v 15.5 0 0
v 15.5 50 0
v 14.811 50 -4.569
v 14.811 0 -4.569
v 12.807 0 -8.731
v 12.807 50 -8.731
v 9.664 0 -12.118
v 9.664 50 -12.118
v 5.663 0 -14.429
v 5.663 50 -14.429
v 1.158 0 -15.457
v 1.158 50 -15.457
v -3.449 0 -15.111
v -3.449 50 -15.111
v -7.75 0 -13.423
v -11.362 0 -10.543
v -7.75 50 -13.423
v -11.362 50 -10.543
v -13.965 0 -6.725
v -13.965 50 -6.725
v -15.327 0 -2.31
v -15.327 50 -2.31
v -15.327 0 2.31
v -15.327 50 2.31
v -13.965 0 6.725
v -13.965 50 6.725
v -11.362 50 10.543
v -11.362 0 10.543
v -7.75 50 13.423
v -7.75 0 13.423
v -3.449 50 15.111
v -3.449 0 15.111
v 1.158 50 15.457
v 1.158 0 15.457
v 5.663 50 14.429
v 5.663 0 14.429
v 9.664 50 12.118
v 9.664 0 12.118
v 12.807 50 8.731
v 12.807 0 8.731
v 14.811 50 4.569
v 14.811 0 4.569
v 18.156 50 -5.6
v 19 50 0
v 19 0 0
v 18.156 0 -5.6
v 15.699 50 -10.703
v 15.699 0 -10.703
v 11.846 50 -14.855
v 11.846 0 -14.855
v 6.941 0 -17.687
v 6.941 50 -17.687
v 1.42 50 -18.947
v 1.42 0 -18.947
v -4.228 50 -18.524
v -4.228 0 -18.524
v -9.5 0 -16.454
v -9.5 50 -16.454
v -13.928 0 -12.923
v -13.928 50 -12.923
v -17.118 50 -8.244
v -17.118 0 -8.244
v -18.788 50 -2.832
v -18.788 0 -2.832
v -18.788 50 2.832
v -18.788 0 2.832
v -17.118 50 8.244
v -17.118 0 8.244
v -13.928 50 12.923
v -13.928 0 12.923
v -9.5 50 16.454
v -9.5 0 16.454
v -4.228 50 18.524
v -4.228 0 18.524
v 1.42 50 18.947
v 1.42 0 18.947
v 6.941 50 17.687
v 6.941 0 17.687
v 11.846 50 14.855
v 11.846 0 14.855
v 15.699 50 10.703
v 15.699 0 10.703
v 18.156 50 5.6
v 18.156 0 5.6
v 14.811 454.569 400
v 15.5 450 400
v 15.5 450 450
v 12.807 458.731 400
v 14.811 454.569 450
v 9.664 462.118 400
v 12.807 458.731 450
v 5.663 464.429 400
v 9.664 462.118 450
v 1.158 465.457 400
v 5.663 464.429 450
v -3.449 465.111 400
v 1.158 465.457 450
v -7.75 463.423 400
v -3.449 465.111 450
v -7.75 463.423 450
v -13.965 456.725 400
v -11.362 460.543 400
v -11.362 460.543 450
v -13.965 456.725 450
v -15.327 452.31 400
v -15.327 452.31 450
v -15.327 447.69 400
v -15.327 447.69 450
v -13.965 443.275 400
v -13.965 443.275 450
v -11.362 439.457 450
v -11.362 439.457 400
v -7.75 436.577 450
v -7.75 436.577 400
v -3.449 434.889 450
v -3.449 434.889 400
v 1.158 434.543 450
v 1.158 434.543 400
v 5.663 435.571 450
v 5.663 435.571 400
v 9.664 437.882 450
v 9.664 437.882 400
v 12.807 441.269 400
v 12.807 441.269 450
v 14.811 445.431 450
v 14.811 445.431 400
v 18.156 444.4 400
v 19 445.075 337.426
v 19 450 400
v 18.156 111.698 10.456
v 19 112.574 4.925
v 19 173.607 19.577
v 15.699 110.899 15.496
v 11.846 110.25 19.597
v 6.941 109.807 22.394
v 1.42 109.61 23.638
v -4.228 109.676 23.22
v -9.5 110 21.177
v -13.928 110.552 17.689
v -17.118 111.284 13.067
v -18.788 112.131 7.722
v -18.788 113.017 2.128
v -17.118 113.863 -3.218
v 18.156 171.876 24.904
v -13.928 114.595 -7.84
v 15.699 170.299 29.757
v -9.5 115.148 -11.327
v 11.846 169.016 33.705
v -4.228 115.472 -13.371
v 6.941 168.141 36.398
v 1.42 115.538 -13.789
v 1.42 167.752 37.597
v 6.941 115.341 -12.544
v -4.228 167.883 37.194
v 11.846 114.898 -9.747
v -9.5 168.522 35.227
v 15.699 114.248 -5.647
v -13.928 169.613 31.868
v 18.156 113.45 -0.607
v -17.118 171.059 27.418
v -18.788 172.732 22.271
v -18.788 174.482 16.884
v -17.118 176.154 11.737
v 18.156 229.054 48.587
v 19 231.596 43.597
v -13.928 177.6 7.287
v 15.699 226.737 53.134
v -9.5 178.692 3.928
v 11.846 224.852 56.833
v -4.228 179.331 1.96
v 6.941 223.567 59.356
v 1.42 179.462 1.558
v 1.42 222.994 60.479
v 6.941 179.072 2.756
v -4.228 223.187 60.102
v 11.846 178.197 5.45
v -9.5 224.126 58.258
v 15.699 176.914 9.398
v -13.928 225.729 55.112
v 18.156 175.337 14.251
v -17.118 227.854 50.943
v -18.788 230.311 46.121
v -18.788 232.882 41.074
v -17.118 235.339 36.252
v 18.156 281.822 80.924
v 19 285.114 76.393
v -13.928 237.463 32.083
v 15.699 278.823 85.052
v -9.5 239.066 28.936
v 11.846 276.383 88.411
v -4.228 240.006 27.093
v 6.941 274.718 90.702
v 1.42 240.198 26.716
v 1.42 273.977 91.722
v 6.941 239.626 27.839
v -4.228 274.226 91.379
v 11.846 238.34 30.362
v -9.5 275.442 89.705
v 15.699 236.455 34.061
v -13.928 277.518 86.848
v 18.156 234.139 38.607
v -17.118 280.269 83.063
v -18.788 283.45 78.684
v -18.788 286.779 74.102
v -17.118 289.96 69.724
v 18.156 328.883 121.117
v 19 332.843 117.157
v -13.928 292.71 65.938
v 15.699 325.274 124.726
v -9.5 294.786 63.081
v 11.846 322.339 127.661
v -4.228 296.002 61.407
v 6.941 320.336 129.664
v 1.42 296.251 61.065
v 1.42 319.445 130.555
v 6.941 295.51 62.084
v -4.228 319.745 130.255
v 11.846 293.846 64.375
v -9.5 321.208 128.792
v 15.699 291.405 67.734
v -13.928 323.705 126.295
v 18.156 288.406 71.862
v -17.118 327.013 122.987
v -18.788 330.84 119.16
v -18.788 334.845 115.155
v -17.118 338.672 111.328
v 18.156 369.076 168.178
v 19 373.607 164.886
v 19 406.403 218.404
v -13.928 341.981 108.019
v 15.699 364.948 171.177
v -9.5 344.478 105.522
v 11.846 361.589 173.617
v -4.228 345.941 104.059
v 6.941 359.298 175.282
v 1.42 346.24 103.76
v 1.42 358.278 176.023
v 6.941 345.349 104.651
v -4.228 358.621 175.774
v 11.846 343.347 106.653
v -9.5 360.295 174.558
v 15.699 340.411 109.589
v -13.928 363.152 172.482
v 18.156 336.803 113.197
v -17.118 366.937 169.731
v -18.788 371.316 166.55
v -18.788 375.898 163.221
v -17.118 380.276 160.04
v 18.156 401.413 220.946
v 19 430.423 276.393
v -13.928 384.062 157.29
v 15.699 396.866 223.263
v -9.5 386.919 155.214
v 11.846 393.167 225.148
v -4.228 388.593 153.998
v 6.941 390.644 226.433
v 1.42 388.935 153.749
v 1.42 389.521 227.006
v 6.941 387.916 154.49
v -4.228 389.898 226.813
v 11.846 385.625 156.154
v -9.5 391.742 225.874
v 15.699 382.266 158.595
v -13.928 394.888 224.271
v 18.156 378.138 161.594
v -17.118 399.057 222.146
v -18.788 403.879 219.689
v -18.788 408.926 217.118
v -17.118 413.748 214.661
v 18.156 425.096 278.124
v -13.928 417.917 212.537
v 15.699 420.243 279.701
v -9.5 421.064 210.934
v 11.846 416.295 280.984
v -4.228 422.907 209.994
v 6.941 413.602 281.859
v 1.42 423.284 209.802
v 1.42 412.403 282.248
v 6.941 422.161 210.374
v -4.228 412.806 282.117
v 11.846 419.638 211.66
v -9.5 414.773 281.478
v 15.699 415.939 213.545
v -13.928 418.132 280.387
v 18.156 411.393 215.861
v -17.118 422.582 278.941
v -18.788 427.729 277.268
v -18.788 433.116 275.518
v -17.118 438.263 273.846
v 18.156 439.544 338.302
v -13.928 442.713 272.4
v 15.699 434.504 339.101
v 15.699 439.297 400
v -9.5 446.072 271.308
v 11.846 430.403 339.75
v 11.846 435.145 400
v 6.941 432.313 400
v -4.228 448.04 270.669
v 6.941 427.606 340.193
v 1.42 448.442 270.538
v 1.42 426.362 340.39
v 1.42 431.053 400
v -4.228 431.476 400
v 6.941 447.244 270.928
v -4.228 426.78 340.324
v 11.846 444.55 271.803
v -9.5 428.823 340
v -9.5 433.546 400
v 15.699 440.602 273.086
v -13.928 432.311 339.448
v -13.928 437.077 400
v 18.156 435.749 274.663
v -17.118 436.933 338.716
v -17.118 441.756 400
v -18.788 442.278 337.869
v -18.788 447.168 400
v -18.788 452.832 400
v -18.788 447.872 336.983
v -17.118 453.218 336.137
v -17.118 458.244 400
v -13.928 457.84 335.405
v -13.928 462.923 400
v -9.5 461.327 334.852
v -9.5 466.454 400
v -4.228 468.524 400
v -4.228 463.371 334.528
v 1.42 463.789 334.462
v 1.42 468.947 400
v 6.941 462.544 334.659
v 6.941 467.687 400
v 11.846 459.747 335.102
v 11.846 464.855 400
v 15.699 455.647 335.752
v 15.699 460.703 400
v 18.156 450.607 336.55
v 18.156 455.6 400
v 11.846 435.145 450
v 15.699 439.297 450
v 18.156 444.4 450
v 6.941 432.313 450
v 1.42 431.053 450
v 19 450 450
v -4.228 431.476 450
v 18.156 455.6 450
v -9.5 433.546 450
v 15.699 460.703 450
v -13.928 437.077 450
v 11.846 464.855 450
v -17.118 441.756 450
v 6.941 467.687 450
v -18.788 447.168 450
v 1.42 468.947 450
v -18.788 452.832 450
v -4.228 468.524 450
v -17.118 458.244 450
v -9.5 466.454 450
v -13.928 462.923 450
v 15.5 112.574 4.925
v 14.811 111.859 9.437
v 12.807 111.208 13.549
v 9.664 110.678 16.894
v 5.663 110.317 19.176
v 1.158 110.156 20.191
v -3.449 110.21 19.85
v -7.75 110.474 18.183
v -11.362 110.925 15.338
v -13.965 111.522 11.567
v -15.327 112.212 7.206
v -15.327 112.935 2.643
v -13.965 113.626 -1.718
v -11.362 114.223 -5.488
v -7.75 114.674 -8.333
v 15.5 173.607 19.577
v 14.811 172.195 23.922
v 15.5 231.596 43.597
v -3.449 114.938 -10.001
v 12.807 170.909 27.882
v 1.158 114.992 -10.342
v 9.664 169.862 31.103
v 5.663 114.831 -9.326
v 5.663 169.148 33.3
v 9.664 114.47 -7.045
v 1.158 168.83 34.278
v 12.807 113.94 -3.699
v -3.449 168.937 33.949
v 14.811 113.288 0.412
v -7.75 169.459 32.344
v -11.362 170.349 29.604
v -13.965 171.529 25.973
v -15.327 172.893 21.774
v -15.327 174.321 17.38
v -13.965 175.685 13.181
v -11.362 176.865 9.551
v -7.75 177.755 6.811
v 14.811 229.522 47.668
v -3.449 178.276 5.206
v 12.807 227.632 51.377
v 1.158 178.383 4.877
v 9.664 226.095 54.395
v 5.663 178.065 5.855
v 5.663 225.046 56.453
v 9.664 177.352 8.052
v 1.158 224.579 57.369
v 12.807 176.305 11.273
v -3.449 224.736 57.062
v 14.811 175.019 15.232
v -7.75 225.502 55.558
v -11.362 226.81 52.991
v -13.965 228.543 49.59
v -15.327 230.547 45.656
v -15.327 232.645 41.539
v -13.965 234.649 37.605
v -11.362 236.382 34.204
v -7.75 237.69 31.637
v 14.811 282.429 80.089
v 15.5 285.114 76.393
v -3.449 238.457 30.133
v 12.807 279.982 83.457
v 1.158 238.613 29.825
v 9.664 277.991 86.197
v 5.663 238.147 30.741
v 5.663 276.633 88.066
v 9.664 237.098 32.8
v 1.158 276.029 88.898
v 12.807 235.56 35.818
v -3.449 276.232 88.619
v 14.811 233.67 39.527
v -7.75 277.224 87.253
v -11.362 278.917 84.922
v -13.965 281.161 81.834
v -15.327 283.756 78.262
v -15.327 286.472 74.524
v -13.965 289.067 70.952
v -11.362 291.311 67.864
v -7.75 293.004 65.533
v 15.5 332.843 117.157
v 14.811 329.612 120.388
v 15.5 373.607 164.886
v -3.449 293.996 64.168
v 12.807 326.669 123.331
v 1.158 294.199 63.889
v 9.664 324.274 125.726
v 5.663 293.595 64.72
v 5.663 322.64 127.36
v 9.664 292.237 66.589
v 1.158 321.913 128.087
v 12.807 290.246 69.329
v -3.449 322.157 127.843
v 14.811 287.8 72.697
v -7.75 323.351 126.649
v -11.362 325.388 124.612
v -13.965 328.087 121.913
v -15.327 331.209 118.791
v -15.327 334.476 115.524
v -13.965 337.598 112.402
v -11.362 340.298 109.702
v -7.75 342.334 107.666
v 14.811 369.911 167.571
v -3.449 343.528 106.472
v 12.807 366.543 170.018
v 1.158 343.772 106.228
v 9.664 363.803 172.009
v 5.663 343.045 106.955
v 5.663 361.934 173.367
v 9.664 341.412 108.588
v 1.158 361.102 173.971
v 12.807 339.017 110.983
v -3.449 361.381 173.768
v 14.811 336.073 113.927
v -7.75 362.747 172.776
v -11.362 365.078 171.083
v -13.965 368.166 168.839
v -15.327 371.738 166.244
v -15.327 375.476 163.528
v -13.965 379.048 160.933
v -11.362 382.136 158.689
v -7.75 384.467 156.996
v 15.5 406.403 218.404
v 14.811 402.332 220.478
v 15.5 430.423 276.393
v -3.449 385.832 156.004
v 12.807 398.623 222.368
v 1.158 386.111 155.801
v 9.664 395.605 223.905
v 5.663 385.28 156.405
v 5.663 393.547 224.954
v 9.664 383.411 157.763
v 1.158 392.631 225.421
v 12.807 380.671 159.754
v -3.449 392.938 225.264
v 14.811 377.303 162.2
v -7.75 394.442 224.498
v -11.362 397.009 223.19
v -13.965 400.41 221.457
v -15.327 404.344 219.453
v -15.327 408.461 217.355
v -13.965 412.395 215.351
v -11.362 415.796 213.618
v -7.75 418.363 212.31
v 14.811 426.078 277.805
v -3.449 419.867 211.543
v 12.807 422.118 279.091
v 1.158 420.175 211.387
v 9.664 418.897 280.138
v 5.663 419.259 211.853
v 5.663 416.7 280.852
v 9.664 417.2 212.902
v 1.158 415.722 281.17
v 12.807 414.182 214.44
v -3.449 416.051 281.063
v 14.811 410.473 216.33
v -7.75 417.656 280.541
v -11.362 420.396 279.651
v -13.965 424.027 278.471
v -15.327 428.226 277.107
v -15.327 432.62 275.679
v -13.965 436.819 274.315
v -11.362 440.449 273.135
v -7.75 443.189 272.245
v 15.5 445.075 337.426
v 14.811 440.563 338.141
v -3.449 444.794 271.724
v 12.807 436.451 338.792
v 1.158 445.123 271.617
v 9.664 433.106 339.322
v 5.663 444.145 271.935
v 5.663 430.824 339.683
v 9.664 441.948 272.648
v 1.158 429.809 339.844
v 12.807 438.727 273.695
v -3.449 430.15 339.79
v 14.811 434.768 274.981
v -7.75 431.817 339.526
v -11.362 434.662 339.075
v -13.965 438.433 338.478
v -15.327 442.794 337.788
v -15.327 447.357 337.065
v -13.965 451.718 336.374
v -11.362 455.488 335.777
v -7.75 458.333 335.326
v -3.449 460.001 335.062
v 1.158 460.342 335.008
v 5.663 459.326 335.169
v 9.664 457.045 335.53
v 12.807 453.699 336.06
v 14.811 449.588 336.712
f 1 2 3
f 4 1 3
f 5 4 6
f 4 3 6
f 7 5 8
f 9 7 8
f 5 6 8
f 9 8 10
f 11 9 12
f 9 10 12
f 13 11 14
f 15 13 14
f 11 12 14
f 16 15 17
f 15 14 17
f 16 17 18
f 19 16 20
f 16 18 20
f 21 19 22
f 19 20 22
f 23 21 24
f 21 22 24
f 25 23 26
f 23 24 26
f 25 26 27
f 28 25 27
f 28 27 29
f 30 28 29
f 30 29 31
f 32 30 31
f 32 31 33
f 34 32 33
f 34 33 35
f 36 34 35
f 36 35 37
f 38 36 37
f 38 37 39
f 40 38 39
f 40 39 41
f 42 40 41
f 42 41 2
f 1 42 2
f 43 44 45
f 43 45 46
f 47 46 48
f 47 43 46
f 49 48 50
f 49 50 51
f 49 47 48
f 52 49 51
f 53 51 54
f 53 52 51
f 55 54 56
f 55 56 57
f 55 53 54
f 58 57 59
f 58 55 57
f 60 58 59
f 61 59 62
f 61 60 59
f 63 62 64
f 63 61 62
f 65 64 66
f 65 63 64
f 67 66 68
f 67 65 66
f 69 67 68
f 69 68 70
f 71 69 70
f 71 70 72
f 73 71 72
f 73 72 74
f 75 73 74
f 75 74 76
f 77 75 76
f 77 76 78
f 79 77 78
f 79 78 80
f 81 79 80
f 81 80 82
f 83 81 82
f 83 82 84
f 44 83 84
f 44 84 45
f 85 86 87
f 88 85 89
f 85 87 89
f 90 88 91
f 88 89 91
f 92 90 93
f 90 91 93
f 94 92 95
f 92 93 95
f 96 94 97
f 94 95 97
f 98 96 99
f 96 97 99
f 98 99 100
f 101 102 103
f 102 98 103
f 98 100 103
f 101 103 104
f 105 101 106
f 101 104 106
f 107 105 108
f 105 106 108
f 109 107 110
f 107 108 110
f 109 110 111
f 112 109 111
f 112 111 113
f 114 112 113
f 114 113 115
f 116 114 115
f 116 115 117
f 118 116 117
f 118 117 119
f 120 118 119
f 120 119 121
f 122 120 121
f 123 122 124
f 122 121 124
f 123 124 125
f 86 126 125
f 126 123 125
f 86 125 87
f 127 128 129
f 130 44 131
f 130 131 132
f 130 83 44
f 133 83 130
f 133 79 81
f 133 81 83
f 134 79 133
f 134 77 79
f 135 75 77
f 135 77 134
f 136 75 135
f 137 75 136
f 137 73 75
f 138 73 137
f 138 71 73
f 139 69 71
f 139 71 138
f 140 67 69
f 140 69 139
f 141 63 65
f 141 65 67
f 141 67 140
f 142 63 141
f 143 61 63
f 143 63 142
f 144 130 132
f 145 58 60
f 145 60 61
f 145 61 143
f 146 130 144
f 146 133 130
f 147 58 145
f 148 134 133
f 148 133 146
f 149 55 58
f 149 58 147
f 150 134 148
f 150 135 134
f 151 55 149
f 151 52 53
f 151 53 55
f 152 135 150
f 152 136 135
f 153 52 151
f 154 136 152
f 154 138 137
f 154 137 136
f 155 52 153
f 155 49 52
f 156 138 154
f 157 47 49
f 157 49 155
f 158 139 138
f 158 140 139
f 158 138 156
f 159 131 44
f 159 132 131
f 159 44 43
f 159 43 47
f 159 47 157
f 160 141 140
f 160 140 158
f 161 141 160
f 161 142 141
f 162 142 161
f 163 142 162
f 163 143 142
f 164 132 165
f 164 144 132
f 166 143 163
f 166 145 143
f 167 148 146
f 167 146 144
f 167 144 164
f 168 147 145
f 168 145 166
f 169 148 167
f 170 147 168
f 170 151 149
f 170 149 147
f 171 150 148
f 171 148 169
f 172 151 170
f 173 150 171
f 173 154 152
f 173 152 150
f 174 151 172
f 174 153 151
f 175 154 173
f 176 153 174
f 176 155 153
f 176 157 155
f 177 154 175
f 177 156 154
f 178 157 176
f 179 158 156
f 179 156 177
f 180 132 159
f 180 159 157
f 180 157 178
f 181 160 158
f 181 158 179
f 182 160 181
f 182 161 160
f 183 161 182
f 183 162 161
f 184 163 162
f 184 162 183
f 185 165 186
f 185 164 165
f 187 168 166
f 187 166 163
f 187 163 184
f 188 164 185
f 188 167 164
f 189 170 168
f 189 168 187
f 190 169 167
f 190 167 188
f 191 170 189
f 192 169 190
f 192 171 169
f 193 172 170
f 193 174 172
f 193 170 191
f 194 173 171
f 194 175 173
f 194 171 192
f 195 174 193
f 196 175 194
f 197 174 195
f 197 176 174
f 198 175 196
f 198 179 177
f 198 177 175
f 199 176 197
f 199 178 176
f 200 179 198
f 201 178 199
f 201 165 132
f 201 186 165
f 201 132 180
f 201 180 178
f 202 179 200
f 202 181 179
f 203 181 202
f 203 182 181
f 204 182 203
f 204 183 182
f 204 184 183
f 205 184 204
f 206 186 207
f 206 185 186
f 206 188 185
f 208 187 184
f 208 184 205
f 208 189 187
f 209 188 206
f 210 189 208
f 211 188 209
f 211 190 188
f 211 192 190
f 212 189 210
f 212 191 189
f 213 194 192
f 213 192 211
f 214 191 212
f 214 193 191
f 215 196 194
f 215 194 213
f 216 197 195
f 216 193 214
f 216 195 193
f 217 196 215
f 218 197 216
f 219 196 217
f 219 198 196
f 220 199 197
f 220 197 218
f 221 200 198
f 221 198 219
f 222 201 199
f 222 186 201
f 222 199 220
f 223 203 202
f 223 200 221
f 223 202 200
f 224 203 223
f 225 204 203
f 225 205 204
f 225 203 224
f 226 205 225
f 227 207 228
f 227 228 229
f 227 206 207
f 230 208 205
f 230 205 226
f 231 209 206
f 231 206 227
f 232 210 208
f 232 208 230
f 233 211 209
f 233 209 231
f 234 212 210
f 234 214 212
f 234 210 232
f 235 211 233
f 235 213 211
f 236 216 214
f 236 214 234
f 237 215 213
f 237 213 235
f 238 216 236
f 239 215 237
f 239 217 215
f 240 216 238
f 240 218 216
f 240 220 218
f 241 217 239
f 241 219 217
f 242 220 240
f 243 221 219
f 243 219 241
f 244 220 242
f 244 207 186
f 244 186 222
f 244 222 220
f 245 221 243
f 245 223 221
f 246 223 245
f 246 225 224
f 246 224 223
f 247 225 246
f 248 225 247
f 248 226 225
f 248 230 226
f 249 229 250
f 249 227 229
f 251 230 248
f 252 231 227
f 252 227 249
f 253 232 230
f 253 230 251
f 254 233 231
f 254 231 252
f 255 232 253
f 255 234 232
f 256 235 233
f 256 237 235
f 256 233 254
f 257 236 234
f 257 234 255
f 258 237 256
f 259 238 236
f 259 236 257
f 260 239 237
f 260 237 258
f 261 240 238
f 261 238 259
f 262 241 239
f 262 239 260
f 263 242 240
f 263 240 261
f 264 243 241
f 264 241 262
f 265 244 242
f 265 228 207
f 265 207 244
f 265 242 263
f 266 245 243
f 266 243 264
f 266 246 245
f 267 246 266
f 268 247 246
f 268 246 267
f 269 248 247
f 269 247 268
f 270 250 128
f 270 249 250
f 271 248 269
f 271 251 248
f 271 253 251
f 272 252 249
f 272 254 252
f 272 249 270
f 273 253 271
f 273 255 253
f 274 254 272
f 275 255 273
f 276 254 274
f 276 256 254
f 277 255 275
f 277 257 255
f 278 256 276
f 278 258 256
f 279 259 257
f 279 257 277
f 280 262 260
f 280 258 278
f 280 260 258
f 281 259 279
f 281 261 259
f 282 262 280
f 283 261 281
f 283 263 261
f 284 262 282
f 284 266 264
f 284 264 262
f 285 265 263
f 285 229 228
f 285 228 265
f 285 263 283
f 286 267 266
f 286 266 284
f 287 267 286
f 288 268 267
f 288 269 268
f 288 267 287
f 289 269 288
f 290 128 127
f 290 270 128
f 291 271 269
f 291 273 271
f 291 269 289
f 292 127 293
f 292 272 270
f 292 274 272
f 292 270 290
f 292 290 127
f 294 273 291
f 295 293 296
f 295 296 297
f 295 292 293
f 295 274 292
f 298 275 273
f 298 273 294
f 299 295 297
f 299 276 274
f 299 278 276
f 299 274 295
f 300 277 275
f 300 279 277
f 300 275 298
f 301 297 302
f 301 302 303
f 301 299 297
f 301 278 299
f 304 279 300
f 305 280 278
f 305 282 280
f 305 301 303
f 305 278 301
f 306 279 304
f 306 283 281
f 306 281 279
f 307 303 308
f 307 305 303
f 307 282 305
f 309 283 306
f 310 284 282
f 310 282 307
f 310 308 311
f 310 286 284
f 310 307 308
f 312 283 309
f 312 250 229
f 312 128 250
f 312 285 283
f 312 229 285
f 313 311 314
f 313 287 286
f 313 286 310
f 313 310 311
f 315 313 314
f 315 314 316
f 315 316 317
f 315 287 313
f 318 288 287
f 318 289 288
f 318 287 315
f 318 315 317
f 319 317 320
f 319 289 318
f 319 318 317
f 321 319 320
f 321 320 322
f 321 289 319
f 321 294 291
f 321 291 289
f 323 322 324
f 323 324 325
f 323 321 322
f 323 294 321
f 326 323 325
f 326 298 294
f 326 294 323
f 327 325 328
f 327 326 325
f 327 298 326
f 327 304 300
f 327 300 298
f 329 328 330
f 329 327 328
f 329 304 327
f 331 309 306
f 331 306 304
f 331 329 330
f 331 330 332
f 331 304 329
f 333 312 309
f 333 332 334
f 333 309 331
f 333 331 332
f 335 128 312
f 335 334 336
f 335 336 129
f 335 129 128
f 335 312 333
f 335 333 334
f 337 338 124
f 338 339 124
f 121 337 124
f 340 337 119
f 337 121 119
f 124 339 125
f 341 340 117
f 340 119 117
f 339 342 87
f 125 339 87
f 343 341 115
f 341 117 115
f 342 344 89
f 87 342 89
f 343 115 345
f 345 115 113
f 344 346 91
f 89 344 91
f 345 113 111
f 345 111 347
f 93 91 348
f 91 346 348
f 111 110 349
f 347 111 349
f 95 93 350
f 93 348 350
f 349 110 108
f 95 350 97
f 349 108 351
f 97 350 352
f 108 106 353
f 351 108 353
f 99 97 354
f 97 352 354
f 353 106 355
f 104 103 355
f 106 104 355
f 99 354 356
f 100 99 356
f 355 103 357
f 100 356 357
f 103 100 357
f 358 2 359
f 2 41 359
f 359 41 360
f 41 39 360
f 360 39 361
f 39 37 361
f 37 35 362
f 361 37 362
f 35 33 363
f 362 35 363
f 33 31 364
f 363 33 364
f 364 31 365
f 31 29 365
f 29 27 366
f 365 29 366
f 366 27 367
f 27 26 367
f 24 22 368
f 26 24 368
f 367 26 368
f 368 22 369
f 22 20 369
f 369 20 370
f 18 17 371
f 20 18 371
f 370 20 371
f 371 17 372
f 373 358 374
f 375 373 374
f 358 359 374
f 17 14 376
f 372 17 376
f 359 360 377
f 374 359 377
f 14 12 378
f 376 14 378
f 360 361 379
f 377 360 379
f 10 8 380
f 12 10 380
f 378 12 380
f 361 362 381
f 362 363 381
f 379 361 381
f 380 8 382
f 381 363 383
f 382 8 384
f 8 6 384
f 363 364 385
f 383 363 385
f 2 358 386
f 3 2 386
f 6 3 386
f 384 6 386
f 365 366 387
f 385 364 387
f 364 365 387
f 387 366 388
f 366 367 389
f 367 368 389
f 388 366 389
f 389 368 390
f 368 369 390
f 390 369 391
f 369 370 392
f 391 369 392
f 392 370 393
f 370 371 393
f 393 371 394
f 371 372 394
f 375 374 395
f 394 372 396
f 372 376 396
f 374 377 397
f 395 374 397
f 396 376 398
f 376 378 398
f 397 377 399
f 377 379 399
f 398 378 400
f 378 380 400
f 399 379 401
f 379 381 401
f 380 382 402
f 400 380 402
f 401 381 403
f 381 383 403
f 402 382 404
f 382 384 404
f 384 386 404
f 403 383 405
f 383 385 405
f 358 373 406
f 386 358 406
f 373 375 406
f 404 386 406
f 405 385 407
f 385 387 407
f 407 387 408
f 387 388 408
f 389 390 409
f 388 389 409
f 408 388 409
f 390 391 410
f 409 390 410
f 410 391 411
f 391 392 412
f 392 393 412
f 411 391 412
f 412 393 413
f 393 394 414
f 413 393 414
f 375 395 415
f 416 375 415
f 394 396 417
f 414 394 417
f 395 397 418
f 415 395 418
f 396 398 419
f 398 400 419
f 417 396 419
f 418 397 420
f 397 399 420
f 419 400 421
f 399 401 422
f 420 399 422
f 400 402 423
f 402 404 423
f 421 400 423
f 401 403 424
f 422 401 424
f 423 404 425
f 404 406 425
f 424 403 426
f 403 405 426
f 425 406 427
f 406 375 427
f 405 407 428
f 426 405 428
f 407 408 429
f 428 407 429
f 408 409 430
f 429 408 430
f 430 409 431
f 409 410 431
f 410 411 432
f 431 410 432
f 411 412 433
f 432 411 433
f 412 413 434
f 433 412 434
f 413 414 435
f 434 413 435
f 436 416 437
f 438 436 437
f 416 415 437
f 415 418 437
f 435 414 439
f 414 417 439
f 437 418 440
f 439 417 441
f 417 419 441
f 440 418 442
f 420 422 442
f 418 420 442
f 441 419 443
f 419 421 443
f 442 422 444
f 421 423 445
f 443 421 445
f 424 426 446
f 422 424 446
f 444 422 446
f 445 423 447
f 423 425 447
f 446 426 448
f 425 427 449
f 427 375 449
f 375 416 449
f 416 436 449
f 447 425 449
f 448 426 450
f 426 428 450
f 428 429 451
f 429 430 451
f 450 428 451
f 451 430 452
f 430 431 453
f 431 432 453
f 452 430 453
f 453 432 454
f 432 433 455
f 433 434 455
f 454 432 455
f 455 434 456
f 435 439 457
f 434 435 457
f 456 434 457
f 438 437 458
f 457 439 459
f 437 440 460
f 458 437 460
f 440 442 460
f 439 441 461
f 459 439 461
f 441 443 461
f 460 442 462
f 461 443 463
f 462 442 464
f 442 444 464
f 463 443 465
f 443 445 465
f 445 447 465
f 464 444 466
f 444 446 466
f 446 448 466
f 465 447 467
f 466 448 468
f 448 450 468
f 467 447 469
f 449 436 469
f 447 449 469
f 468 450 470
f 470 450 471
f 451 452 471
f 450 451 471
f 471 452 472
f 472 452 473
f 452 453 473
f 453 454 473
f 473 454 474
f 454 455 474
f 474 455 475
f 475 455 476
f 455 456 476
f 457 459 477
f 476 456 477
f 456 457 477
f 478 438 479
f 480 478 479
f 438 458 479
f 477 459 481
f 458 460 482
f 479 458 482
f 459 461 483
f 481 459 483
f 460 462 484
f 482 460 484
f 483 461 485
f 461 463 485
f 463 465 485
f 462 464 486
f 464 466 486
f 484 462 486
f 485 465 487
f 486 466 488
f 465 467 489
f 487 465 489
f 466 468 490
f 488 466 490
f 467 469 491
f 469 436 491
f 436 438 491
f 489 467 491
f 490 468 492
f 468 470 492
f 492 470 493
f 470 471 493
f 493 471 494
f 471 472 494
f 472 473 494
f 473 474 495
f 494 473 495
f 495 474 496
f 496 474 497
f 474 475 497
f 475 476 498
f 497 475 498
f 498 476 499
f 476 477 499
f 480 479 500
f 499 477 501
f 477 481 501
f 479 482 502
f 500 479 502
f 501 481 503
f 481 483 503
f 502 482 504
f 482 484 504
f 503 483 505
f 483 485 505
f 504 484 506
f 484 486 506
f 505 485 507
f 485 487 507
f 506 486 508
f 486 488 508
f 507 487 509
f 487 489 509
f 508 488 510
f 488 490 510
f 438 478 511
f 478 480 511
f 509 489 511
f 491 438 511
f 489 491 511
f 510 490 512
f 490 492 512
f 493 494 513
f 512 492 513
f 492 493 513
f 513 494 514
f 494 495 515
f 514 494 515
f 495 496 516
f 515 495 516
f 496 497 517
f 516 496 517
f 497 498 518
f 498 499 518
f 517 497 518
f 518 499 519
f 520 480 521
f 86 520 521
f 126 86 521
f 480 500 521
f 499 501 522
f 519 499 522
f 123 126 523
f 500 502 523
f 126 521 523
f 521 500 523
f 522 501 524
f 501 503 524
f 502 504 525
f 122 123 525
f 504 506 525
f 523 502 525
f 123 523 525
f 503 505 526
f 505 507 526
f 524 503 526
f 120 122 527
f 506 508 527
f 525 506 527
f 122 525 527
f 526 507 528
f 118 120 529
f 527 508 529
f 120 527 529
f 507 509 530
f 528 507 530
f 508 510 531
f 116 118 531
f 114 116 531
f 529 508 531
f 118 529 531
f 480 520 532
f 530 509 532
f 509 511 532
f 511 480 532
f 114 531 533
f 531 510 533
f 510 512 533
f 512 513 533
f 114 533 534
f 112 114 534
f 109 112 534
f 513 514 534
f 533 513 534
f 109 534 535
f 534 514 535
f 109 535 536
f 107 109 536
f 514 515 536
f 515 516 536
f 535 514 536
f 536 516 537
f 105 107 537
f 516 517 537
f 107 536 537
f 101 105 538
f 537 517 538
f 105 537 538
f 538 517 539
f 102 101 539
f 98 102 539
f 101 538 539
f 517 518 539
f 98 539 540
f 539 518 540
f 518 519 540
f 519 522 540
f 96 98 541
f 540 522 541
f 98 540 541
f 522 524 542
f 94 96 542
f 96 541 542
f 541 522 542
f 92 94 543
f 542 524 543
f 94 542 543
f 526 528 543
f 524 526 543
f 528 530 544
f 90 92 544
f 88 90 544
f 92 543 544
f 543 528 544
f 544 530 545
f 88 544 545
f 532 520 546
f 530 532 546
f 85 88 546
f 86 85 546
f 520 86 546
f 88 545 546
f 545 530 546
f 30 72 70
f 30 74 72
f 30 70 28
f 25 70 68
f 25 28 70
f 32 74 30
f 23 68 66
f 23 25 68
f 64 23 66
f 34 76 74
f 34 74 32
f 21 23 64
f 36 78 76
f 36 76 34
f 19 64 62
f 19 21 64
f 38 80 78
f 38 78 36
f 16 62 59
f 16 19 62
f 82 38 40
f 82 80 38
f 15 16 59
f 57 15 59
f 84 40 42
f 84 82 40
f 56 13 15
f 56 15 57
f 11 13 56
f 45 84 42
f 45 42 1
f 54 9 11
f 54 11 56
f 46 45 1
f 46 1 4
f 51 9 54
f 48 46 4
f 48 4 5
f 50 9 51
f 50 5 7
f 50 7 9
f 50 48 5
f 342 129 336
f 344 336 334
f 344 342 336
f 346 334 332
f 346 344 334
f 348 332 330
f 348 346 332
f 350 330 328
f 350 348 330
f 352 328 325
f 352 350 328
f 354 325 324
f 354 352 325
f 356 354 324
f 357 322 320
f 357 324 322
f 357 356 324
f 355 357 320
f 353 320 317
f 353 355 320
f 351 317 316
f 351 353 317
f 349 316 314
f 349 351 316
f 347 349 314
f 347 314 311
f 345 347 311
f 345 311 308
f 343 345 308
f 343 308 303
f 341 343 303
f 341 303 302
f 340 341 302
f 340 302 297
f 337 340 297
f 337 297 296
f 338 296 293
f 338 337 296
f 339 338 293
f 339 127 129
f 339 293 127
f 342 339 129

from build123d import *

# Parameters (mm, degrees)
F0_R   = 19
F0_R_2 = 15.5


with BuildPart() as f2:
    # F2: sweep along a path in F1
    with BuildLine(Plane.YZ) as f2_path:
        Line((0, 0), (50, 0))
        ThreePointArc((50, 0), (332.8427124746, 117.1572875254), (450, 400))
        Line((450, 400), (450, 450))
    # F0 (on Front) → F2 (sweep)
    with BuildSketch(Plane.XZ):
        Circle(F0_R)
        Circle(F0_R_2, mode=Mode.SUBTRACT)
    sweep(path=f2_path.line)


solid = f2.part
